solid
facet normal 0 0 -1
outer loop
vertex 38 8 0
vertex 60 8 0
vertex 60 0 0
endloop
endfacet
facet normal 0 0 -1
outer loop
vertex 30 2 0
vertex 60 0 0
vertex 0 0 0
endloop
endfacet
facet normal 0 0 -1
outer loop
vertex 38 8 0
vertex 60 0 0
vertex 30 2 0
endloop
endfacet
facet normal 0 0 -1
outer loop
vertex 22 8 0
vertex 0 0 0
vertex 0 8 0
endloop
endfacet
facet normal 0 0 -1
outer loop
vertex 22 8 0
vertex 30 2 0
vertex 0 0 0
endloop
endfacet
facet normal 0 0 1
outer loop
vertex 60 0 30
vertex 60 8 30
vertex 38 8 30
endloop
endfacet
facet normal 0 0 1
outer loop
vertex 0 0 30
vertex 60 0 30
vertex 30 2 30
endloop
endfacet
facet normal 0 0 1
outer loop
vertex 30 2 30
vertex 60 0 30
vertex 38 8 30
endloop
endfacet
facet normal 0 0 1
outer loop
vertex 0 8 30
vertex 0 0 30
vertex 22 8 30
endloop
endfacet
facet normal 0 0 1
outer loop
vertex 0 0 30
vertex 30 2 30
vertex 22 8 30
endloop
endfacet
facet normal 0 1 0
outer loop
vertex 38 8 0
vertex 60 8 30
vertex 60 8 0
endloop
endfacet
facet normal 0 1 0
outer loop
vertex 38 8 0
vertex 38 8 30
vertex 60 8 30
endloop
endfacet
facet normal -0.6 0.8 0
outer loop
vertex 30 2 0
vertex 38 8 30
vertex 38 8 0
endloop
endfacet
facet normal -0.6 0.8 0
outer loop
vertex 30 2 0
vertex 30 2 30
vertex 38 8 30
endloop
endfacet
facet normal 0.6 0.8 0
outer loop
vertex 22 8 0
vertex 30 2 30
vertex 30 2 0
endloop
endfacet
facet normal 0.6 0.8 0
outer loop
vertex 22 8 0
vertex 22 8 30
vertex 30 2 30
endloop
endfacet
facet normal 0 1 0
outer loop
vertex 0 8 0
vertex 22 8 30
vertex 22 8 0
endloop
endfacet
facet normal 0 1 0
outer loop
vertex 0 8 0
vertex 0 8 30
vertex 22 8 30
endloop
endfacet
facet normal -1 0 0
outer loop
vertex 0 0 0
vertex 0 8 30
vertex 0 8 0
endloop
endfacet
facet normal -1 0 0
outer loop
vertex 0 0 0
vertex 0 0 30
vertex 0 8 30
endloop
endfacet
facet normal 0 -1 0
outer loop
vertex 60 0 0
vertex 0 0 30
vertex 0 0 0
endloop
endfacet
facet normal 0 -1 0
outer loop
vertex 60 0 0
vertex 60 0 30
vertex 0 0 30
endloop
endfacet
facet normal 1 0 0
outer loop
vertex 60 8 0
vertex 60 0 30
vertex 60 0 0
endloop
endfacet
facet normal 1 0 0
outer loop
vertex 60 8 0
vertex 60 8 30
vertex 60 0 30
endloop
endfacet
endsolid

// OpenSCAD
$fn = 32;

// ----------------------------------------------------------------------
// V guide rail: vway, 60 mm wide
// ----------------------------------------------------------------------

// --- parameters (mm) ---
rail_w = 60;              // rail width, X
base_t = 8;               // base plate thickness
v_depth = 6;              // V feature depth / height
v_half_w = 8;             // half width of the V at the base face
plate_t = 30;             // rail length, Z (the extrusion height)
fit_tol = 0.1;            // declared fit tolerance (prompt contract)
free_tol = 0.3;           // declared free tolerance (prompt contract)

profile = [[0, 0], [60, 0], [60, 8], [38, 8], [30, 2], [22, 8], [0, 8]];  // primary outline, 7 points, counter clockwise

// --- the one profile operation ---
linear_extrude(height = plate_t) polygon(points = profile);
